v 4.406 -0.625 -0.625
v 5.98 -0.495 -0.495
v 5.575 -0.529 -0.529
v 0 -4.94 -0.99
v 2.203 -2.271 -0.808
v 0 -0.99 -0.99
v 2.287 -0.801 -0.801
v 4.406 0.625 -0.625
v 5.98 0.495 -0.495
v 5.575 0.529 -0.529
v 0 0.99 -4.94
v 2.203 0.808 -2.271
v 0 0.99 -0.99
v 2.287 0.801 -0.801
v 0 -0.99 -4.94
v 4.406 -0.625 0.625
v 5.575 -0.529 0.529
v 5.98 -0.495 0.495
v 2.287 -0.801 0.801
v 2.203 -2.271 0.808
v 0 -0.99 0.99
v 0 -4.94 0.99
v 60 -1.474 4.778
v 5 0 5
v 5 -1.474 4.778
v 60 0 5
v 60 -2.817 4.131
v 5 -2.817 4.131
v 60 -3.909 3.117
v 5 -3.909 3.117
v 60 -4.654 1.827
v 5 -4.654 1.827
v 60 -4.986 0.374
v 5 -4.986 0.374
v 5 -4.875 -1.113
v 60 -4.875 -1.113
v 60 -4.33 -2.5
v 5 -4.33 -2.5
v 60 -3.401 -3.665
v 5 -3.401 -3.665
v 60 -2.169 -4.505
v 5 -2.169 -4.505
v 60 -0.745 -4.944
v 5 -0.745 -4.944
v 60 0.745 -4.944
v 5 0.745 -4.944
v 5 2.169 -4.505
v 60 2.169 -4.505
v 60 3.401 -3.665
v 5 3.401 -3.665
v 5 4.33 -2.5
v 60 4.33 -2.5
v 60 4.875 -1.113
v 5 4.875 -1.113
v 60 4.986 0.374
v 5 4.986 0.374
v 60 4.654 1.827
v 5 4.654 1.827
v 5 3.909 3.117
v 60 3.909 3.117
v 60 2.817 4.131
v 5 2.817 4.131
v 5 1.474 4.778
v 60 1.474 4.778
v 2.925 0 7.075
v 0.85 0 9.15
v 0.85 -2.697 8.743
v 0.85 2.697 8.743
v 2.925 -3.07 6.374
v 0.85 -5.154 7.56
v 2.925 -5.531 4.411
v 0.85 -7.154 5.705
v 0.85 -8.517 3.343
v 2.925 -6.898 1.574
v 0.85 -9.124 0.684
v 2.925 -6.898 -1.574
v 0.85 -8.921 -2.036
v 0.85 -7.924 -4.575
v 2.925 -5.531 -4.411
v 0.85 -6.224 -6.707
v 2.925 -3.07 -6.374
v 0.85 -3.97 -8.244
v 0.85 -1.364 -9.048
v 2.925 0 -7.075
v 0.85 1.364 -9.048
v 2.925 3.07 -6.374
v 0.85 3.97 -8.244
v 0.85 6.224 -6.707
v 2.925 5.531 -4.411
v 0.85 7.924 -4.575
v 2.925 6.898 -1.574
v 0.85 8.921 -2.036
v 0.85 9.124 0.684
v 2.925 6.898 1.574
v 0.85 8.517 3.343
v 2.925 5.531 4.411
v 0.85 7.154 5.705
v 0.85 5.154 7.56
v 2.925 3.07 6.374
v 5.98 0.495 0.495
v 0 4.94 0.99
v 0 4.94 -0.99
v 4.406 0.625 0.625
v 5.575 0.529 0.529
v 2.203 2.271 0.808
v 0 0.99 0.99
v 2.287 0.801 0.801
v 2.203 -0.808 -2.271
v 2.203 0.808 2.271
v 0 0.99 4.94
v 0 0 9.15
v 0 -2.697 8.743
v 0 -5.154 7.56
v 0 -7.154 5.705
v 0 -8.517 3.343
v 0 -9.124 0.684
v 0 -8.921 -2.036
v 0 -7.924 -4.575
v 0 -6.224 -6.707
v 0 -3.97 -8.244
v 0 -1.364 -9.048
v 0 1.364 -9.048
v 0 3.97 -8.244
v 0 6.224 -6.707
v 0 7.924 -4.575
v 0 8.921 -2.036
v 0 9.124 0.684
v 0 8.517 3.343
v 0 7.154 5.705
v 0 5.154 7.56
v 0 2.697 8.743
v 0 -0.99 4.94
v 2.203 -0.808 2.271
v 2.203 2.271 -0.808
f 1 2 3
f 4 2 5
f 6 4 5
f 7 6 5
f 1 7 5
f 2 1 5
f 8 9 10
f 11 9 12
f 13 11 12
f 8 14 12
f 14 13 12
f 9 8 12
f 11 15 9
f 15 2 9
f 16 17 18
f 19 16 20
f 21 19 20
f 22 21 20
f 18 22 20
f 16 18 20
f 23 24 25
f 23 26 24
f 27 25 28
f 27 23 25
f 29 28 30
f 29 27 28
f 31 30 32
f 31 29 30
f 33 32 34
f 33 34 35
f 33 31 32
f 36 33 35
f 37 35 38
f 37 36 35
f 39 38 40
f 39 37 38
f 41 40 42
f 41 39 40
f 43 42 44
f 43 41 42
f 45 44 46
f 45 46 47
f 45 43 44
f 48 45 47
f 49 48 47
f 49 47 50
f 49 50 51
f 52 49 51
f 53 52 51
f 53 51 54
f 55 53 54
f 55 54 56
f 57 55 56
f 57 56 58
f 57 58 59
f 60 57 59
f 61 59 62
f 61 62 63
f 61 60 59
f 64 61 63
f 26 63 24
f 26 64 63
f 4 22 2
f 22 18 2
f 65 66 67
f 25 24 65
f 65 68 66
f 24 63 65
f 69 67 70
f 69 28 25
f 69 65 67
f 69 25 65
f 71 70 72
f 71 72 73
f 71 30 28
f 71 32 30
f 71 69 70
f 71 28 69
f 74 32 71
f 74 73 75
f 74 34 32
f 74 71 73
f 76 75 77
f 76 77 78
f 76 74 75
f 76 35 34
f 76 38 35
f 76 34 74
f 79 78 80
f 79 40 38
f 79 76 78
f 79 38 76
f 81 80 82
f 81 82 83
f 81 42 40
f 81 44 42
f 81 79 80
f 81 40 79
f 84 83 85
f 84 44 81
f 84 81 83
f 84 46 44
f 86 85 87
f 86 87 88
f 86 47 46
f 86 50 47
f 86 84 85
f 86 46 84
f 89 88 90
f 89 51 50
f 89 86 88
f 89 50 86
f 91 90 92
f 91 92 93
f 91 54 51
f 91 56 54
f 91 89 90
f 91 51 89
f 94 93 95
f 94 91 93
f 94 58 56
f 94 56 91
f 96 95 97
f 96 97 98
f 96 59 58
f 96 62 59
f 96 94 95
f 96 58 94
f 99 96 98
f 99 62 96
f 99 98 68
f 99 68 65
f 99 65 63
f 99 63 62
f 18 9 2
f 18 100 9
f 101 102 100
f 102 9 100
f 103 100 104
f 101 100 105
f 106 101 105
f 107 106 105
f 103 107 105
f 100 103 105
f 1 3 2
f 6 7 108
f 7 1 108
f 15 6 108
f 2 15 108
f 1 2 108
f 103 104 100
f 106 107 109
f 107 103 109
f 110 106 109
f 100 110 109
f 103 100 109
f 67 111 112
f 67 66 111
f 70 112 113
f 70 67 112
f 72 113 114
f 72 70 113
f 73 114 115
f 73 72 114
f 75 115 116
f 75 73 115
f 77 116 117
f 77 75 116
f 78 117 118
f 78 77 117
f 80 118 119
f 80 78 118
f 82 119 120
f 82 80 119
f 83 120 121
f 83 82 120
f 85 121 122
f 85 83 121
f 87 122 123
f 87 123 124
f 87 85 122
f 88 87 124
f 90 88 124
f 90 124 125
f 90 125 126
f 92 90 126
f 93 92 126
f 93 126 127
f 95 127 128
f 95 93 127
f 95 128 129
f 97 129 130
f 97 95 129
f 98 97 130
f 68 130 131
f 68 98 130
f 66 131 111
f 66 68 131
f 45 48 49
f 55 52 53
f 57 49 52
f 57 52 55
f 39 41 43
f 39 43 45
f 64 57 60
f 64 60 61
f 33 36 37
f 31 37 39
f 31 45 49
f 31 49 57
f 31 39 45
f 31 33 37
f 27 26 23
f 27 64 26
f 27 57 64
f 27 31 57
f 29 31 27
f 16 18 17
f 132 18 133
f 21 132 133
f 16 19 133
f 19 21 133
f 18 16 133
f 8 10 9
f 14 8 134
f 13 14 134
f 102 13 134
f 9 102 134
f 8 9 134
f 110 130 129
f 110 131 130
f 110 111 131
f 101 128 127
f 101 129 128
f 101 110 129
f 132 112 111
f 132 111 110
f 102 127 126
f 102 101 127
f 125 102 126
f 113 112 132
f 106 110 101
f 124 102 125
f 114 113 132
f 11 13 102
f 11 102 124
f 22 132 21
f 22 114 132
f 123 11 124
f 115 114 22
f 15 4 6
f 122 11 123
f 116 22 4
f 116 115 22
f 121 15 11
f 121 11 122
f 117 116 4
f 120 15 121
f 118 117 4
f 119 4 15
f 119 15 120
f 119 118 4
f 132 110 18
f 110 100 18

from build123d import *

# Parameters (mm, degrees)
CIRPATTERN1_COUNT = 2
CIRPATTERN1_ANGLE = 90


with BuildPart() as part:
    # BodySke → Base-Revolve (revolve)
    with BuildSketch(Plane.XY, mode=Mode.PRIVATE) as base_revolve_sk:
        Polygon((0, 0), (0, 9.15), (0.85, 9.15), (5, 5), (60, 5), (60, 0), align=None)
    revolve(base_revolve_sk.sketch.rotate(Axis((-6.35, 0, 0), (1, 0, 0)), 90), axis=Axis((-6.35, 0, 0), (1, 0, 0)))

    # Sketch3 → Cross section 0
    with BuildSketch(Plane.ZY):
        with BuildLine():
            Line((-0.99, 4.94), (0.99, 4.94))
            Line((0.99, 4.94), (0.99, -4.94))
            Line((0.99, -4.94), (-0.99, -4.94))
            Line((-0.99, -4.94), (-0.99, 4.94))
        make_face()
    # Sketch4 → Cross section 1
    with BuildSketch(Plane.ZY.offset(-5.98)):
        with BuildLine():
            Line((-0.495, 0.495), (0.495, 0.495))
            Line((0.495, 0.495), (0.495, -0.495))
            Line((0.495, -0.495), (-0.495, -0.495))
            Line((-0.495, -0.495), (-0.495, 0.495))
        make_face()
    cross = loft(mode=Mode.SUBTRACT)

    # CirPattern1: Cross ×2 about axis
    cirpattern1_axis = Axis((0, 0, 0), (1, 0, 0))
    for i in range(1, CIRPATTERN1_COUNT):
        add(cross.rotate(cirpattern1_axis, i * CIRPATTERN1_ANGLE / (CIRPATTERN1_COUNT - 1)), mode=Mode.SUBTRACT)


solid = part.part
